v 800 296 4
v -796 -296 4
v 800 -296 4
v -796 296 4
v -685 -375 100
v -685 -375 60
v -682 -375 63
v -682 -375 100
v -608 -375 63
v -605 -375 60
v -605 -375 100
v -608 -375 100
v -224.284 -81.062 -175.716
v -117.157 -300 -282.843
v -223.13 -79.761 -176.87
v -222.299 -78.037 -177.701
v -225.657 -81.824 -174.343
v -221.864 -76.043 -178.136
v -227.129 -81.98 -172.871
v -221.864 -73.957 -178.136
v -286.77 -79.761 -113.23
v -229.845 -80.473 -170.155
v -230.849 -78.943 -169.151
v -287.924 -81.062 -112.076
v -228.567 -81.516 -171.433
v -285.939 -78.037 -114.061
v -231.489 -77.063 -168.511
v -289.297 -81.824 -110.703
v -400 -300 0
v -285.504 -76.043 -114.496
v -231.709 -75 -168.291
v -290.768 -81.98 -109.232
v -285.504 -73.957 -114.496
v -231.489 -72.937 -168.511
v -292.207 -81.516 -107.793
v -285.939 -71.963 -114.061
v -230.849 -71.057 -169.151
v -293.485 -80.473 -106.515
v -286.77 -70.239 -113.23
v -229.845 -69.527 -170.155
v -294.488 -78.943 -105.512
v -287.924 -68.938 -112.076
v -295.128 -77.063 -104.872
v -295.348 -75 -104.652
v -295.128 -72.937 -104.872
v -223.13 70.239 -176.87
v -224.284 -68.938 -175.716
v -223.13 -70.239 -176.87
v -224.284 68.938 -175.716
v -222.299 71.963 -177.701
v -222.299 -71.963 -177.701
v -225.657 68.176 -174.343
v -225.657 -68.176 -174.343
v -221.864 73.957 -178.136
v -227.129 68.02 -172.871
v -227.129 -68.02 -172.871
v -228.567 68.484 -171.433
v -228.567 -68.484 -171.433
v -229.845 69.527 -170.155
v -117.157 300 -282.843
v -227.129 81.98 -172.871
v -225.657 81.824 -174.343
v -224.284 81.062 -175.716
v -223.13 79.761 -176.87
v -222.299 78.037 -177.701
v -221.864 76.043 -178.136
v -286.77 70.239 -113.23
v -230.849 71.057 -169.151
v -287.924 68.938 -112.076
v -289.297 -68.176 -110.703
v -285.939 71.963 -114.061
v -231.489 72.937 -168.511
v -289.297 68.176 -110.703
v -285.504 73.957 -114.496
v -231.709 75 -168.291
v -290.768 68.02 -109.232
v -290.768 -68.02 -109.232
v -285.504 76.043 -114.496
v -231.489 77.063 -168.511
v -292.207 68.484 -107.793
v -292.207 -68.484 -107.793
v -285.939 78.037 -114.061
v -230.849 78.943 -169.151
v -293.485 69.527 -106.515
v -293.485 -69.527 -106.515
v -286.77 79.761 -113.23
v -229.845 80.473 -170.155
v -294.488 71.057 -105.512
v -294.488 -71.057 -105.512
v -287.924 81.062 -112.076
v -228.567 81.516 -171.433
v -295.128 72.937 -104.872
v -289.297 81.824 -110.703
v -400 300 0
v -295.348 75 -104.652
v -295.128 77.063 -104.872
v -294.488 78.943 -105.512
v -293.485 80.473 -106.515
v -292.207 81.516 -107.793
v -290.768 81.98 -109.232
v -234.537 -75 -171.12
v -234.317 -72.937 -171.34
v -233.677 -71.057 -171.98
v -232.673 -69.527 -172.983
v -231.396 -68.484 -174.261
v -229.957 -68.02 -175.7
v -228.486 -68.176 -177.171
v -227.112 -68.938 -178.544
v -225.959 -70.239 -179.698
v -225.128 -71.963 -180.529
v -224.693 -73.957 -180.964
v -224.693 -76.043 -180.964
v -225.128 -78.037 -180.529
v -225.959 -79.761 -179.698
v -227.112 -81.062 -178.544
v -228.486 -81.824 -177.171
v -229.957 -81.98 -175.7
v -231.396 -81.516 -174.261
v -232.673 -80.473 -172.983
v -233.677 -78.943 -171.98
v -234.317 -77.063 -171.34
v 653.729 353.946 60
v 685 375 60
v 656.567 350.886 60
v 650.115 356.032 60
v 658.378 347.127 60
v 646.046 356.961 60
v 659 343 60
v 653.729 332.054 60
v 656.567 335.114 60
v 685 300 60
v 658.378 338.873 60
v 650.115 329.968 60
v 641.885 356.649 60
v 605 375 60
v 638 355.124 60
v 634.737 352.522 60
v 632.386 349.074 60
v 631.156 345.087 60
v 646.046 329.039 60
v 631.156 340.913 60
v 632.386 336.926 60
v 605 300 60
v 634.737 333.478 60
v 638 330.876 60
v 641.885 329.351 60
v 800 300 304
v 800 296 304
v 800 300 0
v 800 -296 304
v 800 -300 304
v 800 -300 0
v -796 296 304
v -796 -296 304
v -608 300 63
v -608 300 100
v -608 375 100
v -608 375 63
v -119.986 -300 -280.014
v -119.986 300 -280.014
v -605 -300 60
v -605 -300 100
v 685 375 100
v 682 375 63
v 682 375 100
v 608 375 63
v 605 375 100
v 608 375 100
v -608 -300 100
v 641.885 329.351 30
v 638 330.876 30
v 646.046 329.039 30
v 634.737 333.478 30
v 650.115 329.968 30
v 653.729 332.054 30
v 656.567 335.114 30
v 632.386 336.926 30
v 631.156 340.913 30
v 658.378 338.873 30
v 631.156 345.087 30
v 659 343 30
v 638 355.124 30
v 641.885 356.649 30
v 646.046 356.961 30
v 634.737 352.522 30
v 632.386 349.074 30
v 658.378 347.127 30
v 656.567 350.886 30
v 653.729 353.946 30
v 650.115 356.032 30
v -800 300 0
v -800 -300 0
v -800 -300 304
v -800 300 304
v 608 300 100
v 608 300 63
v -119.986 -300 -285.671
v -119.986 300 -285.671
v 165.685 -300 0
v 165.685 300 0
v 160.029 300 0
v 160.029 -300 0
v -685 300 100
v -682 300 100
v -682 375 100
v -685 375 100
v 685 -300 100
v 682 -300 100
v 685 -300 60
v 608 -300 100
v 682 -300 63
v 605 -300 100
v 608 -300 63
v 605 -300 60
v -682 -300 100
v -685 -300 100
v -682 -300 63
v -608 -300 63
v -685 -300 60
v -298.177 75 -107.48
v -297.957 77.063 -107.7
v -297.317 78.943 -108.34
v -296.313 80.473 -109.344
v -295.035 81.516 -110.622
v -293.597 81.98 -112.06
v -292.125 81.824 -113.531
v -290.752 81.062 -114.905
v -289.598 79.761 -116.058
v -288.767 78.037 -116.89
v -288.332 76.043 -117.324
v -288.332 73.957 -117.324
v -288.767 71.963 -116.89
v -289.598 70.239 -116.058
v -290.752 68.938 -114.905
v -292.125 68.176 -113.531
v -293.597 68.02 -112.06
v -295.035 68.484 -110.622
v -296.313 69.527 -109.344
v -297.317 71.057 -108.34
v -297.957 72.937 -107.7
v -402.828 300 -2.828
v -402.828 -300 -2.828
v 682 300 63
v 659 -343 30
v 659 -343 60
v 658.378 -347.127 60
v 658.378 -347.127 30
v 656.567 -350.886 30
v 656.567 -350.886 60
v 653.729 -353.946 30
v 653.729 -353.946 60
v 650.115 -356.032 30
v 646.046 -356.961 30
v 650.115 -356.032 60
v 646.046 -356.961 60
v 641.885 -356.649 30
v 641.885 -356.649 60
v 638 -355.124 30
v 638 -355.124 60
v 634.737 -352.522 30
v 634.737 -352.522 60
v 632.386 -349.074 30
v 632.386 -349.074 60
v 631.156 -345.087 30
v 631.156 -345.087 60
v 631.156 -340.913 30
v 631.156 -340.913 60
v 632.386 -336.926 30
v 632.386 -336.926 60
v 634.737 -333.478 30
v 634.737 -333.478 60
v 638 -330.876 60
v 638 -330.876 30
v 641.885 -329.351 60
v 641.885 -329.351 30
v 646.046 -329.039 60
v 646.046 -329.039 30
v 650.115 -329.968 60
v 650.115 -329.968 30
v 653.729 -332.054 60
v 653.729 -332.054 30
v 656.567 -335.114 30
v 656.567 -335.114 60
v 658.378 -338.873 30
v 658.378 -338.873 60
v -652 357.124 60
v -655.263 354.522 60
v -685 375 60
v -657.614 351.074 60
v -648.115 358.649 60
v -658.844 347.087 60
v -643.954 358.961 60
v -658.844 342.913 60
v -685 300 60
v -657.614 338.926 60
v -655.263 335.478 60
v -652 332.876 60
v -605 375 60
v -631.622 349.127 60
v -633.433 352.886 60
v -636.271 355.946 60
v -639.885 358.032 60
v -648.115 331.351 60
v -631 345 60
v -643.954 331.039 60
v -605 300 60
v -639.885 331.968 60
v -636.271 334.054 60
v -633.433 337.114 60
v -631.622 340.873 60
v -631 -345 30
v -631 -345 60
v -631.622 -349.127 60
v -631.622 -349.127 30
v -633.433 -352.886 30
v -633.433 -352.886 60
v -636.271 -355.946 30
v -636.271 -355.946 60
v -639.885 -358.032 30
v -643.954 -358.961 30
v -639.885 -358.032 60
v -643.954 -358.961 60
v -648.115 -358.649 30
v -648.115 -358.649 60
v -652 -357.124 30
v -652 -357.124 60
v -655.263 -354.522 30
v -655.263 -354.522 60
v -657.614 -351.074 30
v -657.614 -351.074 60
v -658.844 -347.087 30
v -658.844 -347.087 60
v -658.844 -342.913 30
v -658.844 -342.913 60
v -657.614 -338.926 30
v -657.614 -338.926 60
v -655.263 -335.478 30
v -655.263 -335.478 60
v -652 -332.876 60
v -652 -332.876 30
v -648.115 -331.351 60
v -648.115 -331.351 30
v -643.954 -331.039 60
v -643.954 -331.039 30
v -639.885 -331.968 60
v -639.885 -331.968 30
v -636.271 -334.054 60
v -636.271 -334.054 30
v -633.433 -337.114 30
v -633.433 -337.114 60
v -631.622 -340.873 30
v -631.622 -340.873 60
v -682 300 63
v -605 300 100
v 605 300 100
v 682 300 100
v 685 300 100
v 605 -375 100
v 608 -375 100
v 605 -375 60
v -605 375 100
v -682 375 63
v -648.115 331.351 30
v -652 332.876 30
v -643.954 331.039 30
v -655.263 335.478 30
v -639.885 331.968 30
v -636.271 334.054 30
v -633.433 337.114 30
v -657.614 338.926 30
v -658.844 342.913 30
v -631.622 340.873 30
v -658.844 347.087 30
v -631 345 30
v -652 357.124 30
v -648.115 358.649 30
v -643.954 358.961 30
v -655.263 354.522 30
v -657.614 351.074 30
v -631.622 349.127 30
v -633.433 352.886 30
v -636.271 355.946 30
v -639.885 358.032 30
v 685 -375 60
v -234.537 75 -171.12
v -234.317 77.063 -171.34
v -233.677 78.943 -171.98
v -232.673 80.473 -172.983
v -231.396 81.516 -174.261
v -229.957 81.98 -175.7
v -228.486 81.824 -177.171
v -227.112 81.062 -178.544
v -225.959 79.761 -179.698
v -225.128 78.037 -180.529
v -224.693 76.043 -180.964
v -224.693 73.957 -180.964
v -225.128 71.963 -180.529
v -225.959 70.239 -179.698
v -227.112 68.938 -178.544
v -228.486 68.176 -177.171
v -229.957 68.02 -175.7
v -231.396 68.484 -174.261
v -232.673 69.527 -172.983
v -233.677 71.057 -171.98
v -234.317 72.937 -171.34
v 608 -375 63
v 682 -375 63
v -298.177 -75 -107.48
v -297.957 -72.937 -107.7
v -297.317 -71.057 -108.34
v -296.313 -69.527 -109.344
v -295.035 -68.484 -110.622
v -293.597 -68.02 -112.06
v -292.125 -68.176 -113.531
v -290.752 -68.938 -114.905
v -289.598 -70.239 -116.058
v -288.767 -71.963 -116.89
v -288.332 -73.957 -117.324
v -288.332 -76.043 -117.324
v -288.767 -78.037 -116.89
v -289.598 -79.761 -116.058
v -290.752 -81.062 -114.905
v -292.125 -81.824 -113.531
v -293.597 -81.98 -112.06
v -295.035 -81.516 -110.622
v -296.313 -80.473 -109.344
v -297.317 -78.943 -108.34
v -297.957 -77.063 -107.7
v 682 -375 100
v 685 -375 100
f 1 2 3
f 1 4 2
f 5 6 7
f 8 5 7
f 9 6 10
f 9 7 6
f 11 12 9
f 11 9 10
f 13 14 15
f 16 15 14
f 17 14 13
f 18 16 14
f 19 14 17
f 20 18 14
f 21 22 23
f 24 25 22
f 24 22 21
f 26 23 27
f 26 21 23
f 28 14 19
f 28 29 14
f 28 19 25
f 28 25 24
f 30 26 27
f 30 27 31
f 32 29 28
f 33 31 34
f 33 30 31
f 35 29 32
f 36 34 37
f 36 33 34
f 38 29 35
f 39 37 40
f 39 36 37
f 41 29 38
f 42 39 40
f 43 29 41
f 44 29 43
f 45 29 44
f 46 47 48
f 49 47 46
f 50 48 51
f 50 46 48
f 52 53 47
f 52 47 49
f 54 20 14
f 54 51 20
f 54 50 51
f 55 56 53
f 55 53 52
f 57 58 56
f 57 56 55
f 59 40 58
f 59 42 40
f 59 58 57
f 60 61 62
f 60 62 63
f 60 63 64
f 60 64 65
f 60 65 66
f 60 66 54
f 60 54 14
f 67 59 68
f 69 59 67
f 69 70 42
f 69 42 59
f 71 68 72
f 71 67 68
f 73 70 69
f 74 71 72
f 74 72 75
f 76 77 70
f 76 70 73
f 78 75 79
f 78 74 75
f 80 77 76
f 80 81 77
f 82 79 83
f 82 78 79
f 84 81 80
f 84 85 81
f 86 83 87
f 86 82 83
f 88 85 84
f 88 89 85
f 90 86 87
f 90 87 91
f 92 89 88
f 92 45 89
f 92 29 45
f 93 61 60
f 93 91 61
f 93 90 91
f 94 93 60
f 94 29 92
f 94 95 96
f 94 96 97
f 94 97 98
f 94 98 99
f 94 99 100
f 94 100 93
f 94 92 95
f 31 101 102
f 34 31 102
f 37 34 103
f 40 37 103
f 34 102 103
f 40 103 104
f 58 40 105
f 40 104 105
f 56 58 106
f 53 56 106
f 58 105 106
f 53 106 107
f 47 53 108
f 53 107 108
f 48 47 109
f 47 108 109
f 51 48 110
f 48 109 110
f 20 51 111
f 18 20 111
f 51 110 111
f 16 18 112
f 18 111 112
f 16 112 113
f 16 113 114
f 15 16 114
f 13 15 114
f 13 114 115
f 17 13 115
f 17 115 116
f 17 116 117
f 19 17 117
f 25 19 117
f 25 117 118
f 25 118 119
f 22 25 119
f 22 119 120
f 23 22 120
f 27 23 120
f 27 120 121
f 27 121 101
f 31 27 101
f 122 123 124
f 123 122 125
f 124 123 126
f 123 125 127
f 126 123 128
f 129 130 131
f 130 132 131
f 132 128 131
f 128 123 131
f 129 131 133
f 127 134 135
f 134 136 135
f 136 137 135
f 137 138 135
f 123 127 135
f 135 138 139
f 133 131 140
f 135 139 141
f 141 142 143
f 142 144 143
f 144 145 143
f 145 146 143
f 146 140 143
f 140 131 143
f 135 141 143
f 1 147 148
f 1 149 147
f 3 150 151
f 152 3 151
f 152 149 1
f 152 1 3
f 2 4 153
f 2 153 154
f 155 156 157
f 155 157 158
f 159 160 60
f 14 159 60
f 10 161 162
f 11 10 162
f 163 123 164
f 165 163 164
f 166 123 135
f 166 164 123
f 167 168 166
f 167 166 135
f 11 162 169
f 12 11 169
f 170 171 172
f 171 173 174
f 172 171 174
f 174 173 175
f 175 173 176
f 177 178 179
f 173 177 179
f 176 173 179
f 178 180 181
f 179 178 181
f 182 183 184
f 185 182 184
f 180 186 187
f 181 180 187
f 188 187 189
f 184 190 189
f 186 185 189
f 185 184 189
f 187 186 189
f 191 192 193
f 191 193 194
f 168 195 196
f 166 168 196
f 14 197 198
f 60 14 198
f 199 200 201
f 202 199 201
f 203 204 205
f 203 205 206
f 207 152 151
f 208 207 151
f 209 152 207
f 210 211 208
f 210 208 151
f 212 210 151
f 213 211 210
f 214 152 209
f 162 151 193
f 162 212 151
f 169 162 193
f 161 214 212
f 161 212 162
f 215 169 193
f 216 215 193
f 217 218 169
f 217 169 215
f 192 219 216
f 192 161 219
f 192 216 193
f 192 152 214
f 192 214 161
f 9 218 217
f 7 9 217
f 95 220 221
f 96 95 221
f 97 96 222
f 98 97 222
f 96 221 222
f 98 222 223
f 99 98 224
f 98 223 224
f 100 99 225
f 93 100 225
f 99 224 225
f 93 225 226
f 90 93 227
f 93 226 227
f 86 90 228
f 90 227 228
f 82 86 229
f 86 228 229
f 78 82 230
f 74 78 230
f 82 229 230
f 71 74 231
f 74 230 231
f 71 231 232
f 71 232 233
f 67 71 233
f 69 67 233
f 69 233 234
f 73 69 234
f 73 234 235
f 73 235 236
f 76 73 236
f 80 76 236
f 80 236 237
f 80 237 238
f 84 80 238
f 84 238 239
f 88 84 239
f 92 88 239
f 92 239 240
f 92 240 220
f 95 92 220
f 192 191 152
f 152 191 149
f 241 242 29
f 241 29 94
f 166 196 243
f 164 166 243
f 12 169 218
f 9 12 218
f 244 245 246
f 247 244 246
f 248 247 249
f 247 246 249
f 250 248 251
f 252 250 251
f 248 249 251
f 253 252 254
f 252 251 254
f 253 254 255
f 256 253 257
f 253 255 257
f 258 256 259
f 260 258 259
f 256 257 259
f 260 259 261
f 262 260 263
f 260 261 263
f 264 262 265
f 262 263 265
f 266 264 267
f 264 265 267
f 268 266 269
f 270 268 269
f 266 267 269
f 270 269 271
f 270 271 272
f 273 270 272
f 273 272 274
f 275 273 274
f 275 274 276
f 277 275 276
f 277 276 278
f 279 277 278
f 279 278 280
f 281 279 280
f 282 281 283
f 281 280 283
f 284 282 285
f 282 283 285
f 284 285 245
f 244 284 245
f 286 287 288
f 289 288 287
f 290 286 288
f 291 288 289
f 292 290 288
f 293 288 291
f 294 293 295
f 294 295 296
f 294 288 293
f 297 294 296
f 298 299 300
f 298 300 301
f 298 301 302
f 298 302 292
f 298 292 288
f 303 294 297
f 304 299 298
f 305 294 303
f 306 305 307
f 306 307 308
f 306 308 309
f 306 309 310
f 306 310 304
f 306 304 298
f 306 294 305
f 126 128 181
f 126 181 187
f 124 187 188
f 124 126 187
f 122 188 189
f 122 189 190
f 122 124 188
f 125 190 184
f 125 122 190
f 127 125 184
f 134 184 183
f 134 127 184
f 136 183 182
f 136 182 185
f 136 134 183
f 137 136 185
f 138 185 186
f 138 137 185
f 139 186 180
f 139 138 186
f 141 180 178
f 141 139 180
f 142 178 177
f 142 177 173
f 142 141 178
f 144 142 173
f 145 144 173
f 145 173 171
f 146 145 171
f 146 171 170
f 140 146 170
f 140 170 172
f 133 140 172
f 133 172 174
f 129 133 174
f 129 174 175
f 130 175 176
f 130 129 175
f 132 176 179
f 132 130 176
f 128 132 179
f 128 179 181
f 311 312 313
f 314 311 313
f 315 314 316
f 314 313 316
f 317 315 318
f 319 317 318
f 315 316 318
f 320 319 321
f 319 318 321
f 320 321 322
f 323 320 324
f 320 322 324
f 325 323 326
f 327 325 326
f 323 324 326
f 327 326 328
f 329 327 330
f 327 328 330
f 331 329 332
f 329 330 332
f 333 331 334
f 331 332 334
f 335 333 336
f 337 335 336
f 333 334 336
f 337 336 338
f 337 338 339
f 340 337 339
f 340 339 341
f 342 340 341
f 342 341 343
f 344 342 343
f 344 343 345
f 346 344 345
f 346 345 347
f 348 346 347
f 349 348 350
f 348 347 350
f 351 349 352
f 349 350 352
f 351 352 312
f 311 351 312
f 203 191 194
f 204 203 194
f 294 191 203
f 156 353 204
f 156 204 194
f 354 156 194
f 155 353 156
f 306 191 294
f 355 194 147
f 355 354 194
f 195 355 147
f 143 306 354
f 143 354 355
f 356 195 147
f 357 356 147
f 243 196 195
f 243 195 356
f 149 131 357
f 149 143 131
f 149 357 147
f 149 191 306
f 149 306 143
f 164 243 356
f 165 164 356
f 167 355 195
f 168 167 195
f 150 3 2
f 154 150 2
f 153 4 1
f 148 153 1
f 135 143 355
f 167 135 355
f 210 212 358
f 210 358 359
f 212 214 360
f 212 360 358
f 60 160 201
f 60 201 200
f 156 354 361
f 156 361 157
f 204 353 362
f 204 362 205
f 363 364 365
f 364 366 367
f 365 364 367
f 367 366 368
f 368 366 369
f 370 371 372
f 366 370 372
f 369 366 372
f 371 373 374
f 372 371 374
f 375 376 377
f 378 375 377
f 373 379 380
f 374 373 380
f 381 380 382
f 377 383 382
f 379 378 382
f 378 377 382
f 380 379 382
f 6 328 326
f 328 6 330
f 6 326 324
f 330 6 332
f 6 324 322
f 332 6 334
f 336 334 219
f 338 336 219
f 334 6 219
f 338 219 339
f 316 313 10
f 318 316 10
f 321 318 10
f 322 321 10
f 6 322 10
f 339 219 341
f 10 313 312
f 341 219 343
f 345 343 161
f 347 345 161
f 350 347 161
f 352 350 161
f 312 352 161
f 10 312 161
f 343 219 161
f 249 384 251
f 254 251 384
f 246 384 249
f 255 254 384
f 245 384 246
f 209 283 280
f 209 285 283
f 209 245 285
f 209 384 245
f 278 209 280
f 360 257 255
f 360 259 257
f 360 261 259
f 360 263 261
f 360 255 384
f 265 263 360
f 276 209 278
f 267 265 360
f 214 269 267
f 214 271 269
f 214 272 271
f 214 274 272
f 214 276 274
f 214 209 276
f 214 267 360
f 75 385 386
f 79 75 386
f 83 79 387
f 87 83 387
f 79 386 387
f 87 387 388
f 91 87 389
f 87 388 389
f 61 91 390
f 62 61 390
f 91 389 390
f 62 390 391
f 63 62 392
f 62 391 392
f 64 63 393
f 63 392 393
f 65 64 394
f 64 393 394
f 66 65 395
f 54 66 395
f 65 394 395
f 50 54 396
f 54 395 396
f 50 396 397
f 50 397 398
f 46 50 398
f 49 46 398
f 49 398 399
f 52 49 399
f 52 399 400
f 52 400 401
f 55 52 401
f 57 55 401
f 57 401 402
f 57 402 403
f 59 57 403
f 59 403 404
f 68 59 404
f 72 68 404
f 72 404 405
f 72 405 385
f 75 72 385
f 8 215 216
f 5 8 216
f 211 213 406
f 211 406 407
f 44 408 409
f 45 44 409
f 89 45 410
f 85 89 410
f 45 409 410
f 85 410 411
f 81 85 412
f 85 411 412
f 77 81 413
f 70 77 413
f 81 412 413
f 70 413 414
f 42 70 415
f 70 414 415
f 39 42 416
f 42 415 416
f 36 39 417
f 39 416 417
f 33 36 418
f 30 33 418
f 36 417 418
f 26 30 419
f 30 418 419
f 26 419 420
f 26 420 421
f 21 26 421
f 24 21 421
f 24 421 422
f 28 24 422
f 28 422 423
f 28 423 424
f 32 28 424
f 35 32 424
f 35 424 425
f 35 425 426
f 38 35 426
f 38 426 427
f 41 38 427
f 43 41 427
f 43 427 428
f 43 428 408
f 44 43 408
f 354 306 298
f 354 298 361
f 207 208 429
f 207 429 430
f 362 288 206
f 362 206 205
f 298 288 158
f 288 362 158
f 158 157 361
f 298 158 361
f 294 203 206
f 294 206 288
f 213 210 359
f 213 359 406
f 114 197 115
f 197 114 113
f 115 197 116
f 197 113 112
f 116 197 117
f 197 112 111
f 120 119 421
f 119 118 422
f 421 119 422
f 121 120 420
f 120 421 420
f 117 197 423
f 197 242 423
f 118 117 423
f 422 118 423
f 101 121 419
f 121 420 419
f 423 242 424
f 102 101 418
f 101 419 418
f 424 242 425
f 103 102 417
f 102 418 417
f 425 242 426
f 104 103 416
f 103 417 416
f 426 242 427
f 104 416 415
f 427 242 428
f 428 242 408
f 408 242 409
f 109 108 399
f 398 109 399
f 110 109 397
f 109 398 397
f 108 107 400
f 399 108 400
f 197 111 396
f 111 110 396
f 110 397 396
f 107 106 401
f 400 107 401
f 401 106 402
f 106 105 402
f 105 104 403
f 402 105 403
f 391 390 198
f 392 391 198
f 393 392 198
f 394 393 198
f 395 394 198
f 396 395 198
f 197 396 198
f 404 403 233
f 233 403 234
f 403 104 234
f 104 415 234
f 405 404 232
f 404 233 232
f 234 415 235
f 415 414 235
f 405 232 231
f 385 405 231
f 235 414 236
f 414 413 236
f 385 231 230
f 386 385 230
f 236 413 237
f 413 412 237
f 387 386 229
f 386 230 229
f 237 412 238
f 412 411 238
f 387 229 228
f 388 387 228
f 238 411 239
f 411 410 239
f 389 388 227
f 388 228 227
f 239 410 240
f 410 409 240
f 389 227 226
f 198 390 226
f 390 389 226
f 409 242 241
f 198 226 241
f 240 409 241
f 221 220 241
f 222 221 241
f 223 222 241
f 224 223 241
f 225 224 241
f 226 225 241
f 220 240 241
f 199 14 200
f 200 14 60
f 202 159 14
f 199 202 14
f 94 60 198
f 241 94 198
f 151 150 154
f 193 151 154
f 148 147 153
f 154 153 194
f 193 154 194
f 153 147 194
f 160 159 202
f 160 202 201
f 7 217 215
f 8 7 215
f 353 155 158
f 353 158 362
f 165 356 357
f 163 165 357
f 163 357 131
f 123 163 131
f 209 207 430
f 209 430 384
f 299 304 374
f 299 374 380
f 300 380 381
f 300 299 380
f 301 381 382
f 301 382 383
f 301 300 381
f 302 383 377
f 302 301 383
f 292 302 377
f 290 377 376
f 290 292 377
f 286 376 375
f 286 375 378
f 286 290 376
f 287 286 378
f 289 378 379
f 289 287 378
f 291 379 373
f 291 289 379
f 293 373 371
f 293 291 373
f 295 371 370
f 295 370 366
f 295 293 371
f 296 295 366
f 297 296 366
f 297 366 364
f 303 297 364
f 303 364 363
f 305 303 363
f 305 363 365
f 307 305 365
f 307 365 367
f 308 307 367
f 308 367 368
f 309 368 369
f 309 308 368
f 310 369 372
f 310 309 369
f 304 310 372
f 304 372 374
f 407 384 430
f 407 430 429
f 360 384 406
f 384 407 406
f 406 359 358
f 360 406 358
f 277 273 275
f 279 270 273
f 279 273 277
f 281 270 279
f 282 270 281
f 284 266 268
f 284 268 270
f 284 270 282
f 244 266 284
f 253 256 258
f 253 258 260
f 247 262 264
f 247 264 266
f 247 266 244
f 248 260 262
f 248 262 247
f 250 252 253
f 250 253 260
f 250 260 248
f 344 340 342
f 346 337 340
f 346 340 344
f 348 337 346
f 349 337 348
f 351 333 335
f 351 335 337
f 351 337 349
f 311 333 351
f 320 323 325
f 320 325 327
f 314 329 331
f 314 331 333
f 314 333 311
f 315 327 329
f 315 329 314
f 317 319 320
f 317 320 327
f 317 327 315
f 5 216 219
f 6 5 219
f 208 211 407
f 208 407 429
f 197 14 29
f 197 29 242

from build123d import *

# Parameters (mm, degrees)
SKETCH_1_W          = 1600
SKETCH_1_H          = 600
EXTRUDE_1_DEPTH     = 4
EXTRUDE_2_DEPTH     = 300
EXTRUDE_3_DEPTH     = 75
SKETCH_6_W          = 600
SKETCH_6_H          = 4
EXTRUDE_5_DEPTH     = 400
EXTRUDE_9_REACH     = 1182.949
SKETCH_7_W          = 4
SKETCH_7_H          = 600
SKETCH_4_R          = 14
EXTRUDE_10_DEPTH    = 30
SKETCH_8_R          = 7
CUT_EXTRUDE_1_DEPTH = 20


with BuildPart() as part:
    # 草图1 → 凸台-拉伸1 (new body)
    with BuildSketch(Plane.XY):
        Rectangle(SKETCH_1_W, SKETCH_1_H)
    extrude(amount=EXTRUDE_1_DEPTH)

    # 草图2 → 凸台-拉伸2 (add)
    with BuildSketch(Plane.XY.offset(4)):
        Polygon((796, 296), (-796, 296), (-796, -296), (796, -296), (800, -296), (800, -300), (-800, -300), (-800, 300), (800, 300), (800, 296), align=None)
    extrude(amount=EXTRUDE_2_DEPTH)

    # 草图3 → 凸台-拉伸3 (add)
    with BuildSketch(Plane.XZ.offset(300)):
        Polygon((685, 100), (685, 60), (605, 60), (605, 100), (608, 100), (608, 63), (682, 63), (682, 100), align=None)
        Polygon((-685, 100), (-685, 60), (-605, 60), (-605, 100), (-608, 100), (-608, 63), (-682, 63), (-682, 100), align=None)
    extrude_3 = extrude(amount=EXTRUDE_3_DEPTH)

    # 草图4 → 凸台-拉伸10 (add)
    with BuildSketch(Plane(origin=(0, 0, 60), x_dir=(-1, 0, 0), z_dir=(0, 0, -1))):
        with Locations(Location((-645, -343, 0), (0, 0, 180))):
            Circle(SKETCH_4_R)
        with Locations(Location((645, -345, 0), (0, 0, 180))):
            Circle(SKETCH_4_R)
    extrude_10 = extrude(amount=EXTRUDE_10_DEPTH)

    # 镜向3: 凸台-拉伸3, 凸台-拉伸10 across plane
    add(extrude_3.mirror(Plane.ZX))
    add(extrude_10.mirror(Plane.ZX))


with BuildPart() as body_2:
    # 草图6 → 凸台-拉伸5 (new body)
    with BuildSketch(Plane(origin=(-200, 0, 200), x_dir=(0, 1, 0), z_dir=(-0.7071067811865438, 0, 0.7071067811865512))):
        with Locations((0, 284.842712475)):
            Rectangle(SKETCH_6_W, SKETCH_6_H)
    extrude(amount=-EXTRUDE_5_DEPTH)

    # 草图8 → 切除-拉伸1 (cut)
    with BuildSketch(Plane(origin=(-202.828427125, 0, -202.828427125), x_dir=(-0.7071067811865438, 0, 0.7071067811865513), z_dir=(-0.7071067811865513, 0, -0.7071067811865438))):
        with Locations((127.842712475, 75)):
            Circle(SKETCH_8_R)
        with Locations((127.842712475, -75)):
            Circle(SKETCH_8_R)
        with Locations((37.842712475, -75)):
            Circle(SKETCH_8_R)
        with Locations((37.842712475, 75)):
            Circle(SKETCH_8_R)
    extrude(amount=-CUT_EXTRUDE_1_DEPTH, mode=Mode.SUBTRACT)


with BuildPart() as body_3:
    # 凸台-拉伸9: up to this plane
    extrude_9_end = Plane(origin=(0, 0, 0), z_dir=(0, 0, -1))
    # 草图7 → 凸台-拉伸9 (new, up to the surface)
    with BuildSketch(Plane(origin=(-200, 0, -200), x_dir=(0.7071067811865438, 0, -0.7071067811865513), z_dir=(0.7071067811865513, 0, 0.7071067811865438)), mode=Mode.PRIVATE) as extrude_9_sk1:
        with Locations((115.157287525, 0)):
            Rectangle(SKETCH_7_W, SKETCH_7_H)
    extrude_9_tool1 = split(extrude(extrude_9_sk1.sketch, amount=EXTRUDE_9_REACH, mode=Mode.PRIVATE), bisect_by=extrude_9_end, keep=Keep.BOTH, mode=Mode.PRIVATE)
    add(extrude_9_tool1.solids().sort_by_distance((-118.571501, 0, -281.428499))[0])


solid = Compound([part.part, body_2.part, body_3.part])
